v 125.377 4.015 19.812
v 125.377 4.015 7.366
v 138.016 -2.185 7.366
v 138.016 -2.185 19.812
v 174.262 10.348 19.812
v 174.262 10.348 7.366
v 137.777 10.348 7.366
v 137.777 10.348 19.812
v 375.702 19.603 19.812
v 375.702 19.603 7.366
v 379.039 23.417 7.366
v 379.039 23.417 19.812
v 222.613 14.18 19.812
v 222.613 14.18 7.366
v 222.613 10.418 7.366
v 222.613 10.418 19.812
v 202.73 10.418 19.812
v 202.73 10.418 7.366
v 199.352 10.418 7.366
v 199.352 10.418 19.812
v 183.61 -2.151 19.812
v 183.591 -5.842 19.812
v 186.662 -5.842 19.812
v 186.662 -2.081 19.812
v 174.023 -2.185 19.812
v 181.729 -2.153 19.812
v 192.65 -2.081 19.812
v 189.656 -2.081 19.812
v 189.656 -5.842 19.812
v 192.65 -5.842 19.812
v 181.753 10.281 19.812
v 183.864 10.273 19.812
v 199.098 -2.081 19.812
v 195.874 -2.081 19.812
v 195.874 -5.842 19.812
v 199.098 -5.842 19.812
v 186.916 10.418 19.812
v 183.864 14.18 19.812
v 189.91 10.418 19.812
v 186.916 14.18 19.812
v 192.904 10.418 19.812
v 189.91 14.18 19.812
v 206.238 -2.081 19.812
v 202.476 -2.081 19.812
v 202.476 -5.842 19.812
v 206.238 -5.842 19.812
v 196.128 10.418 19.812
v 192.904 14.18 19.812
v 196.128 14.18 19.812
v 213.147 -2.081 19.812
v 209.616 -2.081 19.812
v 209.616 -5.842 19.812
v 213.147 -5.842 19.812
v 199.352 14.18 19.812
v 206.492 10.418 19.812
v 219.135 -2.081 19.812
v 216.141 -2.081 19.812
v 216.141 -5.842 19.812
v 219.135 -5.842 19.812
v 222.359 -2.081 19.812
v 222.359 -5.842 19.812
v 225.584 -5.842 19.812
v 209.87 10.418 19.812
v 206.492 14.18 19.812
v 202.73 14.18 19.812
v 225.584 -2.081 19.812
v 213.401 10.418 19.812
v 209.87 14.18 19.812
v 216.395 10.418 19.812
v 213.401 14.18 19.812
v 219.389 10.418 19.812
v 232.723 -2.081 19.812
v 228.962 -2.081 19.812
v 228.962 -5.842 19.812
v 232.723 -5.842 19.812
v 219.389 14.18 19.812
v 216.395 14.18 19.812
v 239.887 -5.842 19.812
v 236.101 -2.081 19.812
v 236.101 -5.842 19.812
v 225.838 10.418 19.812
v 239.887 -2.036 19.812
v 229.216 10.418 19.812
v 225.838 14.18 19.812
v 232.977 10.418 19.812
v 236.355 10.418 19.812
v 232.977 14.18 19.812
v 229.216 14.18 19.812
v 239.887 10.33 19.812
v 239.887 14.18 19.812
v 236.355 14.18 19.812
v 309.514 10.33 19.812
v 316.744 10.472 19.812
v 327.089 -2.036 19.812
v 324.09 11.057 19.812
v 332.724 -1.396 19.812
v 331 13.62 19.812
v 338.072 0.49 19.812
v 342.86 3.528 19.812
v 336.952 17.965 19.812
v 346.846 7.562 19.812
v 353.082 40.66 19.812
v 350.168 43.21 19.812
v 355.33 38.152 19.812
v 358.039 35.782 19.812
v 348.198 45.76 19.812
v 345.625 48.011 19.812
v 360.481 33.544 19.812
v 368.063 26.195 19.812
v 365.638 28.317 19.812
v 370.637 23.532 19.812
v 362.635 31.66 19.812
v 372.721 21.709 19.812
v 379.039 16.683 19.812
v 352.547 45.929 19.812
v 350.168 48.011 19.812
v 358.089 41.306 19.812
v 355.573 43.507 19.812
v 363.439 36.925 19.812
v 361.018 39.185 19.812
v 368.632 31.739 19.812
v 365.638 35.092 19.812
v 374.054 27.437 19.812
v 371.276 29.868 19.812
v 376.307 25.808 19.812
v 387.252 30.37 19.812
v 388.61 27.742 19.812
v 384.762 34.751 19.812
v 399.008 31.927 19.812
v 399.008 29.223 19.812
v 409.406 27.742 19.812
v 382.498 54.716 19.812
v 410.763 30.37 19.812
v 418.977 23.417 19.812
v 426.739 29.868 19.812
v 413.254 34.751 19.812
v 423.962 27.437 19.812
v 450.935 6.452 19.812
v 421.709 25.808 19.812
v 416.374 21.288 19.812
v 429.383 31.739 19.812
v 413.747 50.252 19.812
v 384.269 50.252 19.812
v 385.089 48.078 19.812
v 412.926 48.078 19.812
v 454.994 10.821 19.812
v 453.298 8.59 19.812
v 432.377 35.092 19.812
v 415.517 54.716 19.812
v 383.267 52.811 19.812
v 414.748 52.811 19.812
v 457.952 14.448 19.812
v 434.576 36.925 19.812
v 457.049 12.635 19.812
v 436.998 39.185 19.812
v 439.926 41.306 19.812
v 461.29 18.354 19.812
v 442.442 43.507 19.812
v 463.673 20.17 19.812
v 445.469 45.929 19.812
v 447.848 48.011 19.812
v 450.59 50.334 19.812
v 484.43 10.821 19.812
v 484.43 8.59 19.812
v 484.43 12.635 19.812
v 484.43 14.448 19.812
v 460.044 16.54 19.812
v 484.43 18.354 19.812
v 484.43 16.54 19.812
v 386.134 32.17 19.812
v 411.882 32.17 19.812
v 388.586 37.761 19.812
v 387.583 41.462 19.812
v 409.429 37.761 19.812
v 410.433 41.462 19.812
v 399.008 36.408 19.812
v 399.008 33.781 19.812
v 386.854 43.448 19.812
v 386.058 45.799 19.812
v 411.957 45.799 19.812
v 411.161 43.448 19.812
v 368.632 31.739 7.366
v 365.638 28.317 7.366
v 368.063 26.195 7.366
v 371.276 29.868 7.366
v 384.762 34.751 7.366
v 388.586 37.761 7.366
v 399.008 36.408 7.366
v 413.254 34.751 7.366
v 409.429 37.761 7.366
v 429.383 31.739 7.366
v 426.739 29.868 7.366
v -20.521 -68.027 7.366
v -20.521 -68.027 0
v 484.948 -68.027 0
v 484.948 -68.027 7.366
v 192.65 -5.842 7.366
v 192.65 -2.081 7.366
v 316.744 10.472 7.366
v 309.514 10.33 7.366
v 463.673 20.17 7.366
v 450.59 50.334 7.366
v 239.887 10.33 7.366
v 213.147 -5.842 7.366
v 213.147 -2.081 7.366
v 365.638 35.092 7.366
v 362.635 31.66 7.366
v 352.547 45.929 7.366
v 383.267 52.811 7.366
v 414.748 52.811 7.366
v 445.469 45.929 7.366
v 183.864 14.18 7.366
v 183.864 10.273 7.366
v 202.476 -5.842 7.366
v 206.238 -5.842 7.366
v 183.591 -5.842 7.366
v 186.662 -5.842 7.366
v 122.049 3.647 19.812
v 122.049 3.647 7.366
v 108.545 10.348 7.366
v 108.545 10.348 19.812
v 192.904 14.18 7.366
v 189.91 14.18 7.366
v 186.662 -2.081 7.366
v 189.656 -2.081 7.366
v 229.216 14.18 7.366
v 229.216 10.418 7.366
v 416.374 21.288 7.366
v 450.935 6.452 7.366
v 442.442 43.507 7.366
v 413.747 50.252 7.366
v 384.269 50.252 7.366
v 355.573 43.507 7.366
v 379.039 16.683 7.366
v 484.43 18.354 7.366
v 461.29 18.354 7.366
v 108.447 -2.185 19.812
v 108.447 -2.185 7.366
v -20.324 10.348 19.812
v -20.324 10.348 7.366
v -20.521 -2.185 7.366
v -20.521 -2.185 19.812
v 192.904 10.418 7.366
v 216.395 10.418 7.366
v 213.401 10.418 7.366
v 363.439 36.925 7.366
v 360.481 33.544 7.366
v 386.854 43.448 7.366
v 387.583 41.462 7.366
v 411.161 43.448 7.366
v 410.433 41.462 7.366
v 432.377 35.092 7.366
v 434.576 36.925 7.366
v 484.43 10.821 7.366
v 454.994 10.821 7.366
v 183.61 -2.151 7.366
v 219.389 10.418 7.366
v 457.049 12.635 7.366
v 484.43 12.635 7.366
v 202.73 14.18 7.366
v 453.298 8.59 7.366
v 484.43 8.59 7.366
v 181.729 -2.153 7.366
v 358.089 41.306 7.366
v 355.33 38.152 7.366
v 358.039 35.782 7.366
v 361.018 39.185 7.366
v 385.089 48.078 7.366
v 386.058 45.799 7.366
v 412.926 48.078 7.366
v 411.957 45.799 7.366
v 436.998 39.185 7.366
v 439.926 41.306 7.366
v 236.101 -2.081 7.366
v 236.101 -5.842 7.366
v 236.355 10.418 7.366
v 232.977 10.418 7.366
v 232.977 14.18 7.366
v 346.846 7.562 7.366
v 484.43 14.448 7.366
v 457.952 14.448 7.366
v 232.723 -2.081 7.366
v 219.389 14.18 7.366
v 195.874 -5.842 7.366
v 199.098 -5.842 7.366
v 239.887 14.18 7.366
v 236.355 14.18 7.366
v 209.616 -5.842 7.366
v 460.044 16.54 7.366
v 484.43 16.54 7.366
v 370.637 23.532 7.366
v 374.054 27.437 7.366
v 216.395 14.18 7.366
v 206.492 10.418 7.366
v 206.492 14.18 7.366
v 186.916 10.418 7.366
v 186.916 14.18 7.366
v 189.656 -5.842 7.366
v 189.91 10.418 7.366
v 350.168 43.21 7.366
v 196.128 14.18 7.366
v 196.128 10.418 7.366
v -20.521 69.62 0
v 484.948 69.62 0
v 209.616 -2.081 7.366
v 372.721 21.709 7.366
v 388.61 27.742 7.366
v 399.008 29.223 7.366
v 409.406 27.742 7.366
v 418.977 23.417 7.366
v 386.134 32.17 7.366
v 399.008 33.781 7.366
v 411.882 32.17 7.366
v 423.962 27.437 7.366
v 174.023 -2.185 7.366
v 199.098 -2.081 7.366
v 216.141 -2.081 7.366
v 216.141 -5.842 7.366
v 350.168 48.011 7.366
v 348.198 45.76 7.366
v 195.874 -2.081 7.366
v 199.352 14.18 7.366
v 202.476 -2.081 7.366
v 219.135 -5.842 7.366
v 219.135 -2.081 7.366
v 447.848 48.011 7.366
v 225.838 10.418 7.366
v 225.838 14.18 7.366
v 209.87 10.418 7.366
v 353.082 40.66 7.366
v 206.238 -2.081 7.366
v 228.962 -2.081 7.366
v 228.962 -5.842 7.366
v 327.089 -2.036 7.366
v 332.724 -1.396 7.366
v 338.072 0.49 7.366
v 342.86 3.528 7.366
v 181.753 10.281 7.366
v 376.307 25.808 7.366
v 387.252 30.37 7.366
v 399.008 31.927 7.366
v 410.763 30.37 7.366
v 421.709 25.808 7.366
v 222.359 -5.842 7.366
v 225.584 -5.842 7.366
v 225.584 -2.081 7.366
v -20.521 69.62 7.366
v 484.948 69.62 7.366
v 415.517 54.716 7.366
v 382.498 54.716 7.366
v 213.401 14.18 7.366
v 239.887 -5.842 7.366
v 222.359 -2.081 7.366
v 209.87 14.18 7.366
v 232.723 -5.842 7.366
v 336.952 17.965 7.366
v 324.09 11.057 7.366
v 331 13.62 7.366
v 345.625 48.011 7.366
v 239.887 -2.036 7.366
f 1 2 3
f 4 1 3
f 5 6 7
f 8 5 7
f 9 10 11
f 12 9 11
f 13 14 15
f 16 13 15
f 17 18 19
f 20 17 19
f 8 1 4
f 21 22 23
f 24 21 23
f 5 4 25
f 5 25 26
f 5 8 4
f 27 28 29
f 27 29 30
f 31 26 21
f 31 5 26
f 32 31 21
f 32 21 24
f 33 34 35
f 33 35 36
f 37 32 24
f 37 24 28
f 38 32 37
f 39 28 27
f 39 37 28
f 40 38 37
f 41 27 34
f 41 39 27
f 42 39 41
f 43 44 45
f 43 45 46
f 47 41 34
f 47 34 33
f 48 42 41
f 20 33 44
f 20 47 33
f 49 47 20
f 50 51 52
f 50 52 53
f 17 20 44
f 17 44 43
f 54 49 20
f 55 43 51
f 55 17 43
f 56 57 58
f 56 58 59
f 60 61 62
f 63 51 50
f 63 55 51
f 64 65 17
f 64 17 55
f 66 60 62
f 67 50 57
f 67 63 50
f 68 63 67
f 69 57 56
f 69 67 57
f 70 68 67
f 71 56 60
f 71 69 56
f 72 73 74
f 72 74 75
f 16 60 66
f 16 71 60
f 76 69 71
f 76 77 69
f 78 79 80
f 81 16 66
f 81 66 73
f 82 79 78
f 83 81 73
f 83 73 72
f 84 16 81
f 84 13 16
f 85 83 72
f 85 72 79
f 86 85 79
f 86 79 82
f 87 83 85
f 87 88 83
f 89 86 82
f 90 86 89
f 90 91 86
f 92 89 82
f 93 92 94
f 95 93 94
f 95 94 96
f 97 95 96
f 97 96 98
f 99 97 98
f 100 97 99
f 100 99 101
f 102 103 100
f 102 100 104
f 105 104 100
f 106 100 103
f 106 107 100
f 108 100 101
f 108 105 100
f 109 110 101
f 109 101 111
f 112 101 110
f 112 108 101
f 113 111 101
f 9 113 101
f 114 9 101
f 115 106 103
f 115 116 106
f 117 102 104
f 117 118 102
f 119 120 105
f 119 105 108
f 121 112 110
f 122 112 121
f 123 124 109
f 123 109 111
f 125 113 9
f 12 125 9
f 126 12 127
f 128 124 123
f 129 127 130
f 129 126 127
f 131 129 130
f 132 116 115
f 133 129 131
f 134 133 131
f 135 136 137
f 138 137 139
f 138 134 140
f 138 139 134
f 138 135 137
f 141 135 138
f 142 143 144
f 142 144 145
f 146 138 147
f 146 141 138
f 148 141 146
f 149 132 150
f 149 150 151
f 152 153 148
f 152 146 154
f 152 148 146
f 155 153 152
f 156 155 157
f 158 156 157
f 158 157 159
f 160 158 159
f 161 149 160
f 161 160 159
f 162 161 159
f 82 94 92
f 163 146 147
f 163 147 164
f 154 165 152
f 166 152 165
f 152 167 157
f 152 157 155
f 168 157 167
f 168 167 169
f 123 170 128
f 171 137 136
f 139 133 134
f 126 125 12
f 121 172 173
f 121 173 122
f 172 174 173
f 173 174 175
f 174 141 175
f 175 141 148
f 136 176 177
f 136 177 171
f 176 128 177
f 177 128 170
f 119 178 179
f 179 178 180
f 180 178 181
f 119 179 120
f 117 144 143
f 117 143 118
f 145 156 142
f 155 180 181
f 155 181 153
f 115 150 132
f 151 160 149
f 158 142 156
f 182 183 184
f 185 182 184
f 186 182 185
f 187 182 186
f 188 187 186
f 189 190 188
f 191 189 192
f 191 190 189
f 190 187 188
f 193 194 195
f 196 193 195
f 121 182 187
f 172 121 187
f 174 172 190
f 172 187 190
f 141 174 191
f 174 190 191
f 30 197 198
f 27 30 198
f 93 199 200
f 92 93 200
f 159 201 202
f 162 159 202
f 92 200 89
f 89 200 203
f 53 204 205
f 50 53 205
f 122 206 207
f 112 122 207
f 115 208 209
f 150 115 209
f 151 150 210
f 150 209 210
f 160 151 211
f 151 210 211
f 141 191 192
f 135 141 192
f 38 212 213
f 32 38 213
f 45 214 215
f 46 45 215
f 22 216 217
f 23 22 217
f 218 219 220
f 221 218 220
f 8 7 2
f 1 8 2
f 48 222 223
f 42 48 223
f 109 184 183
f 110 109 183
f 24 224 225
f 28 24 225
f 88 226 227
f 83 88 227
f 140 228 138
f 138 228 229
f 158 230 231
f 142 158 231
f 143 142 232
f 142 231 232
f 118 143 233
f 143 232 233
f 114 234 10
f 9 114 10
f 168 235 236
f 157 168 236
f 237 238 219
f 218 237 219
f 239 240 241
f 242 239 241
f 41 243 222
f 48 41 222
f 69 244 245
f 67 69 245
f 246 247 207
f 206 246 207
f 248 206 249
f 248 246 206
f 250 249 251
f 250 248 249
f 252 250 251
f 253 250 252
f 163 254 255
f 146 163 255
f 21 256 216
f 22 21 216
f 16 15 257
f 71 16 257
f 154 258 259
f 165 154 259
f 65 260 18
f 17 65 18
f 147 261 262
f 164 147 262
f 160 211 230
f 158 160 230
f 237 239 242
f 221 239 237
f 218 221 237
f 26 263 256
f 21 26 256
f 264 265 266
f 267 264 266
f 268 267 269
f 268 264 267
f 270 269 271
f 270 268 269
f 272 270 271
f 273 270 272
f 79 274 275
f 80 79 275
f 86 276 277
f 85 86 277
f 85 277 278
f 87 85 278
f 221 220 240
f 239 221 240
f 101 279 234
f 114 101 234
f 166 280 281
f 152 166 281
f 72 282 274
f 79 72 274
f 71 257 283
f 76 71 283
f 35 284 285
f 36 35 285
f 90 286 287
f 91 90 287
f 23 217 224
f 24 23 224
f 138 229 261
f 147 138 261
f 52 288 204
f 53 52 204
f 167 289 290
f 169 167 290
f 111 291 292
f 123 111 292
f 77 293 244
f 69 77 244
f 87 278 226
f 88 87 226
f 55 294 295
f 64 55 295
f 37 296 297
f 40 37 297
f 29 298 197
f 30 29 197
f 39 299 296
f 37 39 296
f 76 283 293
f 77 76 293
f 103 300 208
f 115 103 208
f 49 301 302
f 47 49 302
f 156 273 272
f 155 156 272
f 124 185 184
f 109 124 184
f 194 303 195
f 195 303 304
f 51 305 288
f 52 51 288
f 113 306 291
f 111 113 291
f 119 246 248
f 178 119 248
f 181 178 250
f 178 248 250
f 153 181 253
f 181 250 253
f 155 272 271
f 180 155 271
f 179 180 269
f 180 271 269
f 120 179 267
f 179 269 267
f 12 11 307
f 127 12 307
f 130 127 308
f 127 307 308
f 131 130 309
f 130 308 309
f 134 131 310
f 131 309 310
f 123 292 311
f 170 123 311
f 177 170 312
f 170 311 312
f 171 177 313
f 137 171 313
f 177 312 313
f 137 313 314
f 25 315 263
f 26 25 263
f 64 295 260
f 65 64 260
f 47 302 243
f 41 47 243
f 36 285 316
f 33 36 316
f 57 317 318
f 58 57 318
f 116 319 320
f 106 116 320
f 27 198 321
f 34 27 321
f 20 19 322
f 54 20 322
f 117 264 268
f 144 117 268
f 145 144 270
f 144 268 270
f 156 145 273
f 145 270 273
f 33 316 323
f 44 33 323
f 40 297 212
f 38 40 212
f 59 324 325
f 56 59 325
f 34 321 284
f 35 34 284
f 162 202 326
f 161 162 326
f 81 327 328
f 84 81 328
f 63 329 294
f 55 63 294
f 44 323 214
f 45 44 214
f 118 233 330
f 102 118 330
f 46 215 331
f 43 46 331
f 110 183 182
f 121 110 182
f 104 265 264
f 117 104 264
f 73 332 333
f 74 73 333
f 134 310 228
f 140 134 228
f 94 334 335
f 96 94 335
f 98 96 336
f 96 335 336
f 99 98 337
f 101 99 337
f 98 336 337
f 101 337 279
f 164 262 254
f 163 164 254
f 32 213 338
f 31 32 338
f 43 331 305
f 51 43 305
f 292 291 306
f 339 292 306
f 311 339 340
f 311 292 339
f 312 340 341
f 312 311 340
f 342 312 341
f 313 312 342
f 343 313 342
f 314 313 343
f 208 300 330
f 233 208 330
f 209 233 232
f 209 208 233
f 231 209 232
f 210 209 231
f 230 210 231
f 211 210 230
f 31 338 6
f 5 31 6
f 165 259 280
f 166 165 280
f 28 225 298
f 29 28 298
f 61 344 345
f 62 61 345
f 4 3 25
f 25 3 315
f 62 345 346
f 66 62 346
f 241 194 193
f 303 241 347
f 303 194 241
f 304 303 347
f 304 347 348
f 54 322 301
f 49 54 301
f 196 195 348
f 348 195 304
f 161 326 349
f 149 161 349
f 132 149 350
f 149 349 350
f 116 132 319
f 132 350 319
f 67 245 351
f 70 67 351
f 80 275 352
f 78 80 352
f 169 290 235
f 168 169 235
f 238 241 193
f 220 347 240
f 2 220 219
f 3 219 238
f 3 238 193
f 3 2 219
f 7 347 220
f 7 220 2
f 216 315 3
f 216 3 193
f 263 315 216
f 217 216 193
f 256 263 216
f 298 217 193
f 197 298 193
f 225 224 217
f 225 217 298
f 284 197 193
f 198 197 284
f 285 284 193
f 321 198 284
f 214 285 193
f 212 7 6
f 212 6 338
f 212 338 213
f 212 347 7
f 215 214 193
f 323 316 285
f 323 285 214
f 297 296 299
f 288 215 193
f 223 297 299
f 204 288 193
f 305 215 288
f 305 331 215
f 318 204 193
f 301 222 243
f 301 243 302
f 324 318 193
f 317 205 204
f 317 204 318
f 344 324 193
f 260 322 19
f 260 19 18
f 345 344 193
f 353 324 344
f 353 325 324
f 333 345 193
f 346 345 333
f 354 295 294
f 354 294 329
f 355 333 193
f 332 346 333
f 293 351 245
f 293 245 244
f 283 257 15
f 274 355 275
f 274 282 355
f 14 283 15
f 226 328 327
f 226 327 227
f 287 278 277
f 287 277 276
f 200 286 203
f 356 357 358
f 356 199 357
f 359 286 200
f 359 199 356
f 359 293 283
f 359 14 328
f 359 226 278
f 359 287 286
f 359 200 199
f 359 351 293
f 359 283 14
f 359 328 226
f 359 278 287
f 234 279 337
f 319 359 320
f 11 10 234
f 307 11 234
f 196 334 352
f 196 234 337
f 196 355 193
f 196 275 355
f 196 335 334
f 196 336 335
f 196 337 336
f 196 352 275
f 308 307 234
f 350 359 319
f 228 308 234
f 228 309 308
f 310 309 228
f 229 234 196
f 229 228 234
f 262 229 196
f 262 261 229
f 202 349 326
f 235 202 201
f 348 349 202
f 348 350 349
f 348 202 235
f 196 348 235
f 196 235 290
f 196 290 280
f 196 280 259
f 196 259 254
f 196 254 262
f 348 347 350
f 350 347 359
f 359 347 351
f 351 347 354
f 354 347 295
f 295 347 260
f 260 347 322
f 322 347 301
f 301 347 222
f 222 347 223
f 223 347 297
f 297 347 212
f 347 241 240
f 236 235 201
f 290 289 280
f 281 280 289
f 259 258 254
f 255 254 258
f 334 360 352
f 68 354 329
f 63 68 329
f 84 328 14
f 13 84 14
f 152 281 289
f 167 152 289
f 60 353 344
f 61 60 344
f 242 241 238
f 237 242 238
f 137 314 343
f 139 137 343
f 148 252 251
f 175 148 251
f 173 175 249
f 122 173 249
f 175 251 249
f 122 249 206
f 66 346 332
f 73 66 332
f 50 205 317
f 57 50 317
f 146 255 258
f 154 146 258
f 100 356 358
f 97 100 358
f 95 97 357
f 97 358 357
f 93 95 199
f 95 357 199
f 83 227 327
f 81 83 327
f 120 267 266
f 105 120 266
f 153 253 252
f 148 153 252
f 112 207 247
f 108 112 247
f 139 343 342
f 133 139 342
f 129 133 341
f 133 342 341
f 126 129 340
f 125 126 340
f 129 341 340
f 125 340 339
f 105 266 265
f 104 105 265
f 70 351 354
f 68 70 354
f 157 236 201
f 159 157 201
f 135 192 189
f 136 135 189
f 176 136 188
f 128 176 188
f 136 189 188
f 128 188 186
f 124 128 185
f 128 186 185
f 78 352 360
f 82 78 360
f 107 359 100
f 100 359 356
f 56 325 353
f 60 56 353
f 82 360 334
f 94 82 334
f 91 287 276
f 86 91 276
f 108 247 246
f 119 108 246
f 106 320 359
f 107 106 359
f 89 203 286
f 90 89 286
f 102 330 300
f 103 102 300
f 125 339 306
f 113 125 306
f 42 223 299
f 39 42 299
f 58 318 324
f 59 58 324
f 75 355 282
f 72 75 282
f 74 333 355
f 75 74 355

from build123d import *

# Parameters (mm, degrees)
F0_W     = 505.468076095
F0_H     = 137.6467421651
F1_DEPTH = 7.366
F3_DEPTH = 12.446


# Not quite as in the source:
# - a feature names something its author has since deleted; it is built from what else it names


with BuildPart() as f1:
    # F0 (on Top) → F1 (new body)
    with BuildSketch(Plane.XY):
        with Locations((232.2135167196, 0.7967613637)):
            Rectangle(F0_W, F0_H)
    extrude(amount=F1_DEPTH)

    # F2 (on face) → F3 (join)
    with BuildSketch(Plane.XY.offset(7.366)):
        with BuildLine():
            Line((183.8642209768, 14.1799058765), (183.8642209768, 10.2725932375))
            Line((183.8642209768, 10.2725932375), (181.7528605461, 10.280970484))
            Line((181.7528605461, 10.280970484), (174.2617040873, 10.3483377025))
            Line((174.2617040873, 10.3483377025), (137.7773582935, 10.3483377025))
            Line((137.7773582935, 10.3483377025), (125.377446413, 4.0150946006))
            Line((125.377446413, 4.0150946006), (138.0158215761, -2.1848597098))
            Line((138.0158215761, -2.1848597098), (174.0232408047, -2.1848597098))
            Line((174.0232408047, -2.1848597098), (181.7289143801, -2.1529737648))
            Line((181.7289143801, -2.1529737648), (183.6102157831, -2.1509330043))
            Line((183.6102157831, -2.1509330043), (183.5907548666, -5.8423327282))
            Line((183.5907548666, -5.8423327282), (186.6615414619, -5.8423327282))
            Line((186.6615414619, -5.8423327282), (186.6615414619, -2.0806165412))
            Line((186.6615414619, -2.0806165412), (189.655572176, -2.0806165412))
            Line((189.655572176, -2.0806165412), (189.655572176, -5.8423327282))
            Line((189.655572176, -5.8423327282), (192.6495879889, -5.8423327282))
            Line((192.6495879889, -5.8423327282), (192.6495879889, -2.0806165412))
            Line((192.6495879889, -2.0806165412), (195.8739161491, -2.0806165412))
            Line((195.8739161491, -2.0806165412), (195.8739161491, -5.8423327282))
            Line((195.8739161491, -5.8423327282), (199.0982443094, -5.8423327282))
            Line((199.0982443094, -5.8423327282), (199.0982443094, -2.0806165412))
            Line((199.0982443094, -2.0806165412), (202.4761140347, -2.0806165412))
            Line((202.4761140347, -2.0806165412), (202.4761140347, -5.8423327282))
            Line((202.4761140347, -5.8423327282), (206.2378227711, -5.8423327282))
            Line((206.2378227711, -5.8423327282), (206.2378227711, -2.0806165412))
            Line((206.2378227711, -2.0806165412), (209.6156924963, -2.0806165412))
            Line((209.6156924963, -2.0806165412), (209.6156924963, -5.8423327282))
            Line((209.6156924963, -5.8423327282), (213.1471037865, -5.8423327282))
            Line((213.1471037865, -5.8423327282), (213.1471037865, -2.0806165412))
            Line((213.1471037865, -2.0806165412), (216.1411345005, -2.0806165412))
            Line((216.1411345005, -2.0806165412), (216.1411345005, -5.8423327282))
            Line((216.1411345005, -5.8423327282), (219.1351503134, -5.8423327282))
            Line((219.1351503134, -5.8423327282), (219.1351503134, -2.0806165412))
            Line((219.1351503134, -2.0806165412), (222.3594784737, -2.0806165412))
            Line((222.3594784737, -2.0806165412), (222.3594784737, -5.8423327282))
            Line((222.3594784737, -5.8423327282), (225.5838066339, -5.8423327282))
            Line((225.5838066339, -5.8423327282), (225.5838066339, -2.0806165412))
            Line((225.5838066339, -2.0806165412), (228.9616763592, -2.0806165412))
            Line((228.9616763592, -2.0806165412), (228.9616763592, -5.8423327282))
            Line((228.9616763592, -5.8423327282), (232.7233850956, -5.8423327282))
            Line((232.7233850956, -5.8423327282), (232.7233850956, -2.0806165412))
            Line((232.7233850956, -2.0806165412), (236.1012548208, -2.0806165412))
            Line((236.1012548208, -2.0806165412), (236.1012548208, -5.8423327282))
            Line((236.1012548208, -5.8423327282), (239.886666111, -5.8423327282))
            Line((239.886666111, -5.8423327282), (239.886666111, -2.0361929703))
            Line((239.886666111, -2.0361929703), (308.7113499641, -2.0361929703))
            Line((308.7113499641, -2.0361929703), (327.0893990993, -2.0361929703))
            ThreePointArc((327.0893990993, -2.0361929703), (338.0716042416, 0.4904142901), (346.8455672264, 7.5621996075))
            Line((346.8455672264, 7.5621996075), (379.0387098504, 16.6834991227))
            Line((379.0387098504, 16.6834991227), (375.7017479006, 19.6033408288))
            Line((375.7017479006, 19.6033408288), (379.0387098504, 23.4170116286))
            ThreePointArc((379.0387098504, 23.4170116286), (399.0077273508, 29.2230595274), (418.9767448512, 23.4170116286))
            Line((418.9767448512, 23.4170116286), (416.3737297058, 21.2878081948))
            Line((416.3737297058, 21.2878081948), (450.9352743626, 6.4515918493))
            Line((450.9352743626, 6.4515918493), (453.2975118055, 8.5896141827))
            Line((453.2975118055, 8.5896141827), (484.4302535057, 8.5896141827))
            Line((484.4302535057, 8.5896141827), (484.4302535057, 10.8214179054))
            Line((484.4302535057, 10.8214179054), (454.9943455488, 10.8214179054))
            Line((454.9943455488, 10.8214179054), (457.0494721473, 12.6347579062))
            Line((457.0494721473, 12.6347579062), (484.4302535057, 12.6347579062))
            Line((484.4302535057, 12.6347579062), (484.4302535057, 14.448097907))
            Line((484.4302535057, 14.448097907), (457.9519460917, 14.448097907))
            Line((457.9519460917, 14.448097907), (460.04427444, 16.5404137224))
            Line((460.04427444, 16.5404137224), (484.4302535057, 16.5404137224))
            Line((484.4302535057, 16.5404137224), (484.4302535057, 18.3537546545))
            Line((484.4302535057, 18.3537546545), (461.2901464378, 18.3537546545))
            Line((461.2901464378, 18.3537546545), (463.6734724045, 20.1696325094))
            Line((463.6734724045, 20.1696325094), (450.5897462368, 50.3342226148))
            Line((450.5897462368, 50.3342226148), (447.8478631112, 48.0109341443))
            ThreePointArc((447.8478631112, 48.0109341443), (399.0077273508, 55.560682533), (350.1675915904, 48.0109341443))
            Line((350.1675915904, 48.0109341443), (348.1977880001, 45.759730041))
            Line((348.1977880001, 45.759730041), (345.6249833107, 48.0109341443))
            Line((345.6249833107, 48.0109341443), (336.9521223247, 17.9653423708))
            ThreePointArc((336.9521223247, 17.9653423708), (327.6334286446, 12.1000348485), (316.7435458205, 10.4720494957))
            Line((316.7435458205, 10.4720494957), (309.5143437386, 10.3298625909))
            Line((309.5143437386, 10.3298625909), (239.8866713047, 10.3298625909))
            Line((239.8866713047, 10.3298625909), (239.8866713047, 14.1799058765))
            Line((239.8866713047, 14.1799058765), (236.3552600145, 14.1799058765))
            Line((236.3552600145, 14.1799058765), (236.3552600145, 10.4181896895))
            Line((236.3552600145, 10.4181896895), (232.9773902893, 10.4181896895))
            Line((232.9773902893, 10.4181896895), (232.9773902893, 14.1799058765))
            Line((232.9773902893, 14.1799058765), (229.2156815529, 14.1799058765))
            Line((229.2156815529, 14.1799058765), (229.2156815529, 10.4181896895))
            Line((229.2156815529, 10.4181896895), (225.8378118277, 10.4181896895))
            Line((225.8378118277, 10.4181896895), (225.8378118277, 14.1799058765))
            Line((225.8378118277, 14.1799058765), (222.6134836674, 14.1799058765))
            Line((222.6134836674, 14.1799058765), (222.6134836674, 10.4181896895))
            Line((222.6134836674, 10.4181896895), (219.3891555071, 10.4181896895))
            Line((219.3891555071, 10.4181896895), (219.3891555071, 14.1799058765))
            Line((219.3891555071, 14.1799058765), (216.3951396942, 14.1799058765))
            Line((216.3951396942, 14.1799058765), (216.3951396942, 10.4181896895))
            Line((216.3951396942, 10.4181896895), (213.4011089802, 10.4181896895))
            Line((213.4011089802, 10.4181896895), (213.4011089802, 14.1799058765))
            Line((213.4011089802, 14.1799058765), (209.86969769, 14.1799058765))
            Line((209.86969769, 14.1799058765), (209.86969769, 10.4181896895))
            Line((209.86969769, 10.4181896895), (206.4918279648, 10.4181896895))
            Line((206.4918279648, 10.4181896895), (206.4918279648, 14.1799058765))
            Line((206.4918279648, 14.1799058765), (202.7301192284, 14.1799058765))
            Line((202.7301192284, 14.1799058765), (202.7301192284, 10.4181896895))
            Line((202.7301192284, 10.4181896895), (199.3522495031, 10.4181896895))
            Line((199.3522495031, 10.4181896895), (199.3522495031, 14.1799058765))
            Line((199.3522495031, 14.1799058765), (196.1279213428, 14.1799058765))
            Line((196.1279213428, 14.1799058765), (196.1279213428, 10.4181896895))
            Line((196.1279213428, 10.4181896895), (192.9035931826, 10.4181896895))
            Line((192.9035931826, 10.4181896895), (192.9035931826, 14.1799058765))
            Line((192.9035931826, 14.1799058765), (189.9095773697, 14.1799058765))
            Line((189.9095773697, 14.1799058765), (189.9095773697, 10.4181896895))
            Line((189.9095773697, 10.4181896895), (186.9155466557, 10.4181896895))
            Line((186.9155466557, 10.4181896895), (186.9155466557, 14.1799058765))
            Line((186.9155466557, 14.1799058765), (183.8642209768, 14.1799058765))
        make_face()
        with BuildLine():
            Line((370.6372472565, 23.5322912479), (374.053896924, 27.4370337251))
            ThreePointArc((374.053896924, 27.4370337251), (399.0077273508, 33.7810246324), (423.9615577776, 27.4370337251))
            Line((423.9615577776, 27.4370337251), (421.708929064, 25.8076728149))
            ThreePointArc((421.708929064, 25.8076728149), (399.0077273508, 31.9265013842), (376.3065256376, 25.8076728149))
            Line((376.3065256376, 25.8076728149), (372.7205432622, 21.7094072429))
            Line((372.7205432622, 21.7094072429), (370.6372472565, 23.5322912479))
        make_face(mode=Mode.SUBTRACT)
        with BuildLine():
            Line((365.6382056992, 28.3170708711), (368.6322219076, 31.7388036808))
            ThreePointArc((368.6322219076, 31.7388036808), (399.0077273508, 38.526410097), (429.383232794, 31.7388036808))
            Line((429.383232794, 31.7388036808), (426.7392740049, 29.867535424))
            ThreePointArc((426.7392740049, 29.867535424), (399.0077273508, 36.4081558373), (371.2761806967, 29.867535424))
            Line((371.2761806967, 29.867535424), (368.0630232644, 26.1953555015))
            Line((368.0630232644, 26.1953555015), (365.6382056992, 28.3170708711))
        make_face(mode=Mode.SUBTRACT)
        with BuildLine():
            Line((360.4813304683, 33.5443242144), (363.4392711441, 36.9248278439))
            ThreePointArc((363.4392711441, 36.9248278439), (399.0077273508, 44.2750490819), (434.5761835575, 36.9248278439))
            Line((434.5761835575, 36.9248278439), (432.3772490025, 35.0923612714))
            ThreePointArc((432.3772490025, 35.0923612714), (399.0077273508, 42.2705737087), (365.6382056992, 35.0923612714))
            Line((365.6382056992, 35.0923612714), (362.6348697567, 31.6599773371))
            Line((362.6348697567, 31.6599773371), (360.4813304683, 33.5443242144))
        make_face(mode=Mode.SUBTRACT)
        with BuildLine():
            Line((355.3299033536, 38.152305195), (358.0891265806, 41.3057031687))
            ThreePointArc((358.0891265806, 41.3057031687), (399.0077273508, 48.9346794019), (439.926328121, 41.3057031687))
            Line((439.926328121, 41.3057031687), (436.997769417, 39.1854137116))
            ThreePointArc((436.997769417, 39.1854137116), (399.0077273508, 46.6356083993), (361.0176852847, 39.1854137116))
            Line((361.0176852847, 39.1854137116), (358.0393189878, 35.7815665152))
            Line((358.0393189878, 35.7815665152), (355.3299033536, 38.152305195))
        make_face(mode=Mode.SUBTRACT)
        with BuildLine():
            Line((350.1675915904, 43.2099050709), (352.5468626356, 45.9290719797))
            ThreePointArc((352.5468626356, 45.9290719797), (399.0077273508, 53.6790820799), (445.468592066, 45.9290719797))
            Line((445.468592066, 45.9290719797), (442.4422114296, 43.5071010637))
            ThreePointArc((442.4422114296, 43.5071010637), (399.0077273508, 51.1039718638), (355.573243272, 43.5071010637))
            Line((355.573243272, 43.5071010637), (353.0819166526, 40.6598706415))
            Line((353.0819166526, 40.6598706415), (350.1675915904, 43.2099050709))
        make_face(mode=Mode.SUBTRACT)
        Polygon((108.4468066692, -2.1848597098), (122.0492497087, 3.6468699109), (108.5446923971, 10.3483377025), (-20.3237645328, 10.3483377025), (-20.5205213279, -2.1848597098), align=None)
    extrude(amount=F3_DEPTH)


solid = f1.part
